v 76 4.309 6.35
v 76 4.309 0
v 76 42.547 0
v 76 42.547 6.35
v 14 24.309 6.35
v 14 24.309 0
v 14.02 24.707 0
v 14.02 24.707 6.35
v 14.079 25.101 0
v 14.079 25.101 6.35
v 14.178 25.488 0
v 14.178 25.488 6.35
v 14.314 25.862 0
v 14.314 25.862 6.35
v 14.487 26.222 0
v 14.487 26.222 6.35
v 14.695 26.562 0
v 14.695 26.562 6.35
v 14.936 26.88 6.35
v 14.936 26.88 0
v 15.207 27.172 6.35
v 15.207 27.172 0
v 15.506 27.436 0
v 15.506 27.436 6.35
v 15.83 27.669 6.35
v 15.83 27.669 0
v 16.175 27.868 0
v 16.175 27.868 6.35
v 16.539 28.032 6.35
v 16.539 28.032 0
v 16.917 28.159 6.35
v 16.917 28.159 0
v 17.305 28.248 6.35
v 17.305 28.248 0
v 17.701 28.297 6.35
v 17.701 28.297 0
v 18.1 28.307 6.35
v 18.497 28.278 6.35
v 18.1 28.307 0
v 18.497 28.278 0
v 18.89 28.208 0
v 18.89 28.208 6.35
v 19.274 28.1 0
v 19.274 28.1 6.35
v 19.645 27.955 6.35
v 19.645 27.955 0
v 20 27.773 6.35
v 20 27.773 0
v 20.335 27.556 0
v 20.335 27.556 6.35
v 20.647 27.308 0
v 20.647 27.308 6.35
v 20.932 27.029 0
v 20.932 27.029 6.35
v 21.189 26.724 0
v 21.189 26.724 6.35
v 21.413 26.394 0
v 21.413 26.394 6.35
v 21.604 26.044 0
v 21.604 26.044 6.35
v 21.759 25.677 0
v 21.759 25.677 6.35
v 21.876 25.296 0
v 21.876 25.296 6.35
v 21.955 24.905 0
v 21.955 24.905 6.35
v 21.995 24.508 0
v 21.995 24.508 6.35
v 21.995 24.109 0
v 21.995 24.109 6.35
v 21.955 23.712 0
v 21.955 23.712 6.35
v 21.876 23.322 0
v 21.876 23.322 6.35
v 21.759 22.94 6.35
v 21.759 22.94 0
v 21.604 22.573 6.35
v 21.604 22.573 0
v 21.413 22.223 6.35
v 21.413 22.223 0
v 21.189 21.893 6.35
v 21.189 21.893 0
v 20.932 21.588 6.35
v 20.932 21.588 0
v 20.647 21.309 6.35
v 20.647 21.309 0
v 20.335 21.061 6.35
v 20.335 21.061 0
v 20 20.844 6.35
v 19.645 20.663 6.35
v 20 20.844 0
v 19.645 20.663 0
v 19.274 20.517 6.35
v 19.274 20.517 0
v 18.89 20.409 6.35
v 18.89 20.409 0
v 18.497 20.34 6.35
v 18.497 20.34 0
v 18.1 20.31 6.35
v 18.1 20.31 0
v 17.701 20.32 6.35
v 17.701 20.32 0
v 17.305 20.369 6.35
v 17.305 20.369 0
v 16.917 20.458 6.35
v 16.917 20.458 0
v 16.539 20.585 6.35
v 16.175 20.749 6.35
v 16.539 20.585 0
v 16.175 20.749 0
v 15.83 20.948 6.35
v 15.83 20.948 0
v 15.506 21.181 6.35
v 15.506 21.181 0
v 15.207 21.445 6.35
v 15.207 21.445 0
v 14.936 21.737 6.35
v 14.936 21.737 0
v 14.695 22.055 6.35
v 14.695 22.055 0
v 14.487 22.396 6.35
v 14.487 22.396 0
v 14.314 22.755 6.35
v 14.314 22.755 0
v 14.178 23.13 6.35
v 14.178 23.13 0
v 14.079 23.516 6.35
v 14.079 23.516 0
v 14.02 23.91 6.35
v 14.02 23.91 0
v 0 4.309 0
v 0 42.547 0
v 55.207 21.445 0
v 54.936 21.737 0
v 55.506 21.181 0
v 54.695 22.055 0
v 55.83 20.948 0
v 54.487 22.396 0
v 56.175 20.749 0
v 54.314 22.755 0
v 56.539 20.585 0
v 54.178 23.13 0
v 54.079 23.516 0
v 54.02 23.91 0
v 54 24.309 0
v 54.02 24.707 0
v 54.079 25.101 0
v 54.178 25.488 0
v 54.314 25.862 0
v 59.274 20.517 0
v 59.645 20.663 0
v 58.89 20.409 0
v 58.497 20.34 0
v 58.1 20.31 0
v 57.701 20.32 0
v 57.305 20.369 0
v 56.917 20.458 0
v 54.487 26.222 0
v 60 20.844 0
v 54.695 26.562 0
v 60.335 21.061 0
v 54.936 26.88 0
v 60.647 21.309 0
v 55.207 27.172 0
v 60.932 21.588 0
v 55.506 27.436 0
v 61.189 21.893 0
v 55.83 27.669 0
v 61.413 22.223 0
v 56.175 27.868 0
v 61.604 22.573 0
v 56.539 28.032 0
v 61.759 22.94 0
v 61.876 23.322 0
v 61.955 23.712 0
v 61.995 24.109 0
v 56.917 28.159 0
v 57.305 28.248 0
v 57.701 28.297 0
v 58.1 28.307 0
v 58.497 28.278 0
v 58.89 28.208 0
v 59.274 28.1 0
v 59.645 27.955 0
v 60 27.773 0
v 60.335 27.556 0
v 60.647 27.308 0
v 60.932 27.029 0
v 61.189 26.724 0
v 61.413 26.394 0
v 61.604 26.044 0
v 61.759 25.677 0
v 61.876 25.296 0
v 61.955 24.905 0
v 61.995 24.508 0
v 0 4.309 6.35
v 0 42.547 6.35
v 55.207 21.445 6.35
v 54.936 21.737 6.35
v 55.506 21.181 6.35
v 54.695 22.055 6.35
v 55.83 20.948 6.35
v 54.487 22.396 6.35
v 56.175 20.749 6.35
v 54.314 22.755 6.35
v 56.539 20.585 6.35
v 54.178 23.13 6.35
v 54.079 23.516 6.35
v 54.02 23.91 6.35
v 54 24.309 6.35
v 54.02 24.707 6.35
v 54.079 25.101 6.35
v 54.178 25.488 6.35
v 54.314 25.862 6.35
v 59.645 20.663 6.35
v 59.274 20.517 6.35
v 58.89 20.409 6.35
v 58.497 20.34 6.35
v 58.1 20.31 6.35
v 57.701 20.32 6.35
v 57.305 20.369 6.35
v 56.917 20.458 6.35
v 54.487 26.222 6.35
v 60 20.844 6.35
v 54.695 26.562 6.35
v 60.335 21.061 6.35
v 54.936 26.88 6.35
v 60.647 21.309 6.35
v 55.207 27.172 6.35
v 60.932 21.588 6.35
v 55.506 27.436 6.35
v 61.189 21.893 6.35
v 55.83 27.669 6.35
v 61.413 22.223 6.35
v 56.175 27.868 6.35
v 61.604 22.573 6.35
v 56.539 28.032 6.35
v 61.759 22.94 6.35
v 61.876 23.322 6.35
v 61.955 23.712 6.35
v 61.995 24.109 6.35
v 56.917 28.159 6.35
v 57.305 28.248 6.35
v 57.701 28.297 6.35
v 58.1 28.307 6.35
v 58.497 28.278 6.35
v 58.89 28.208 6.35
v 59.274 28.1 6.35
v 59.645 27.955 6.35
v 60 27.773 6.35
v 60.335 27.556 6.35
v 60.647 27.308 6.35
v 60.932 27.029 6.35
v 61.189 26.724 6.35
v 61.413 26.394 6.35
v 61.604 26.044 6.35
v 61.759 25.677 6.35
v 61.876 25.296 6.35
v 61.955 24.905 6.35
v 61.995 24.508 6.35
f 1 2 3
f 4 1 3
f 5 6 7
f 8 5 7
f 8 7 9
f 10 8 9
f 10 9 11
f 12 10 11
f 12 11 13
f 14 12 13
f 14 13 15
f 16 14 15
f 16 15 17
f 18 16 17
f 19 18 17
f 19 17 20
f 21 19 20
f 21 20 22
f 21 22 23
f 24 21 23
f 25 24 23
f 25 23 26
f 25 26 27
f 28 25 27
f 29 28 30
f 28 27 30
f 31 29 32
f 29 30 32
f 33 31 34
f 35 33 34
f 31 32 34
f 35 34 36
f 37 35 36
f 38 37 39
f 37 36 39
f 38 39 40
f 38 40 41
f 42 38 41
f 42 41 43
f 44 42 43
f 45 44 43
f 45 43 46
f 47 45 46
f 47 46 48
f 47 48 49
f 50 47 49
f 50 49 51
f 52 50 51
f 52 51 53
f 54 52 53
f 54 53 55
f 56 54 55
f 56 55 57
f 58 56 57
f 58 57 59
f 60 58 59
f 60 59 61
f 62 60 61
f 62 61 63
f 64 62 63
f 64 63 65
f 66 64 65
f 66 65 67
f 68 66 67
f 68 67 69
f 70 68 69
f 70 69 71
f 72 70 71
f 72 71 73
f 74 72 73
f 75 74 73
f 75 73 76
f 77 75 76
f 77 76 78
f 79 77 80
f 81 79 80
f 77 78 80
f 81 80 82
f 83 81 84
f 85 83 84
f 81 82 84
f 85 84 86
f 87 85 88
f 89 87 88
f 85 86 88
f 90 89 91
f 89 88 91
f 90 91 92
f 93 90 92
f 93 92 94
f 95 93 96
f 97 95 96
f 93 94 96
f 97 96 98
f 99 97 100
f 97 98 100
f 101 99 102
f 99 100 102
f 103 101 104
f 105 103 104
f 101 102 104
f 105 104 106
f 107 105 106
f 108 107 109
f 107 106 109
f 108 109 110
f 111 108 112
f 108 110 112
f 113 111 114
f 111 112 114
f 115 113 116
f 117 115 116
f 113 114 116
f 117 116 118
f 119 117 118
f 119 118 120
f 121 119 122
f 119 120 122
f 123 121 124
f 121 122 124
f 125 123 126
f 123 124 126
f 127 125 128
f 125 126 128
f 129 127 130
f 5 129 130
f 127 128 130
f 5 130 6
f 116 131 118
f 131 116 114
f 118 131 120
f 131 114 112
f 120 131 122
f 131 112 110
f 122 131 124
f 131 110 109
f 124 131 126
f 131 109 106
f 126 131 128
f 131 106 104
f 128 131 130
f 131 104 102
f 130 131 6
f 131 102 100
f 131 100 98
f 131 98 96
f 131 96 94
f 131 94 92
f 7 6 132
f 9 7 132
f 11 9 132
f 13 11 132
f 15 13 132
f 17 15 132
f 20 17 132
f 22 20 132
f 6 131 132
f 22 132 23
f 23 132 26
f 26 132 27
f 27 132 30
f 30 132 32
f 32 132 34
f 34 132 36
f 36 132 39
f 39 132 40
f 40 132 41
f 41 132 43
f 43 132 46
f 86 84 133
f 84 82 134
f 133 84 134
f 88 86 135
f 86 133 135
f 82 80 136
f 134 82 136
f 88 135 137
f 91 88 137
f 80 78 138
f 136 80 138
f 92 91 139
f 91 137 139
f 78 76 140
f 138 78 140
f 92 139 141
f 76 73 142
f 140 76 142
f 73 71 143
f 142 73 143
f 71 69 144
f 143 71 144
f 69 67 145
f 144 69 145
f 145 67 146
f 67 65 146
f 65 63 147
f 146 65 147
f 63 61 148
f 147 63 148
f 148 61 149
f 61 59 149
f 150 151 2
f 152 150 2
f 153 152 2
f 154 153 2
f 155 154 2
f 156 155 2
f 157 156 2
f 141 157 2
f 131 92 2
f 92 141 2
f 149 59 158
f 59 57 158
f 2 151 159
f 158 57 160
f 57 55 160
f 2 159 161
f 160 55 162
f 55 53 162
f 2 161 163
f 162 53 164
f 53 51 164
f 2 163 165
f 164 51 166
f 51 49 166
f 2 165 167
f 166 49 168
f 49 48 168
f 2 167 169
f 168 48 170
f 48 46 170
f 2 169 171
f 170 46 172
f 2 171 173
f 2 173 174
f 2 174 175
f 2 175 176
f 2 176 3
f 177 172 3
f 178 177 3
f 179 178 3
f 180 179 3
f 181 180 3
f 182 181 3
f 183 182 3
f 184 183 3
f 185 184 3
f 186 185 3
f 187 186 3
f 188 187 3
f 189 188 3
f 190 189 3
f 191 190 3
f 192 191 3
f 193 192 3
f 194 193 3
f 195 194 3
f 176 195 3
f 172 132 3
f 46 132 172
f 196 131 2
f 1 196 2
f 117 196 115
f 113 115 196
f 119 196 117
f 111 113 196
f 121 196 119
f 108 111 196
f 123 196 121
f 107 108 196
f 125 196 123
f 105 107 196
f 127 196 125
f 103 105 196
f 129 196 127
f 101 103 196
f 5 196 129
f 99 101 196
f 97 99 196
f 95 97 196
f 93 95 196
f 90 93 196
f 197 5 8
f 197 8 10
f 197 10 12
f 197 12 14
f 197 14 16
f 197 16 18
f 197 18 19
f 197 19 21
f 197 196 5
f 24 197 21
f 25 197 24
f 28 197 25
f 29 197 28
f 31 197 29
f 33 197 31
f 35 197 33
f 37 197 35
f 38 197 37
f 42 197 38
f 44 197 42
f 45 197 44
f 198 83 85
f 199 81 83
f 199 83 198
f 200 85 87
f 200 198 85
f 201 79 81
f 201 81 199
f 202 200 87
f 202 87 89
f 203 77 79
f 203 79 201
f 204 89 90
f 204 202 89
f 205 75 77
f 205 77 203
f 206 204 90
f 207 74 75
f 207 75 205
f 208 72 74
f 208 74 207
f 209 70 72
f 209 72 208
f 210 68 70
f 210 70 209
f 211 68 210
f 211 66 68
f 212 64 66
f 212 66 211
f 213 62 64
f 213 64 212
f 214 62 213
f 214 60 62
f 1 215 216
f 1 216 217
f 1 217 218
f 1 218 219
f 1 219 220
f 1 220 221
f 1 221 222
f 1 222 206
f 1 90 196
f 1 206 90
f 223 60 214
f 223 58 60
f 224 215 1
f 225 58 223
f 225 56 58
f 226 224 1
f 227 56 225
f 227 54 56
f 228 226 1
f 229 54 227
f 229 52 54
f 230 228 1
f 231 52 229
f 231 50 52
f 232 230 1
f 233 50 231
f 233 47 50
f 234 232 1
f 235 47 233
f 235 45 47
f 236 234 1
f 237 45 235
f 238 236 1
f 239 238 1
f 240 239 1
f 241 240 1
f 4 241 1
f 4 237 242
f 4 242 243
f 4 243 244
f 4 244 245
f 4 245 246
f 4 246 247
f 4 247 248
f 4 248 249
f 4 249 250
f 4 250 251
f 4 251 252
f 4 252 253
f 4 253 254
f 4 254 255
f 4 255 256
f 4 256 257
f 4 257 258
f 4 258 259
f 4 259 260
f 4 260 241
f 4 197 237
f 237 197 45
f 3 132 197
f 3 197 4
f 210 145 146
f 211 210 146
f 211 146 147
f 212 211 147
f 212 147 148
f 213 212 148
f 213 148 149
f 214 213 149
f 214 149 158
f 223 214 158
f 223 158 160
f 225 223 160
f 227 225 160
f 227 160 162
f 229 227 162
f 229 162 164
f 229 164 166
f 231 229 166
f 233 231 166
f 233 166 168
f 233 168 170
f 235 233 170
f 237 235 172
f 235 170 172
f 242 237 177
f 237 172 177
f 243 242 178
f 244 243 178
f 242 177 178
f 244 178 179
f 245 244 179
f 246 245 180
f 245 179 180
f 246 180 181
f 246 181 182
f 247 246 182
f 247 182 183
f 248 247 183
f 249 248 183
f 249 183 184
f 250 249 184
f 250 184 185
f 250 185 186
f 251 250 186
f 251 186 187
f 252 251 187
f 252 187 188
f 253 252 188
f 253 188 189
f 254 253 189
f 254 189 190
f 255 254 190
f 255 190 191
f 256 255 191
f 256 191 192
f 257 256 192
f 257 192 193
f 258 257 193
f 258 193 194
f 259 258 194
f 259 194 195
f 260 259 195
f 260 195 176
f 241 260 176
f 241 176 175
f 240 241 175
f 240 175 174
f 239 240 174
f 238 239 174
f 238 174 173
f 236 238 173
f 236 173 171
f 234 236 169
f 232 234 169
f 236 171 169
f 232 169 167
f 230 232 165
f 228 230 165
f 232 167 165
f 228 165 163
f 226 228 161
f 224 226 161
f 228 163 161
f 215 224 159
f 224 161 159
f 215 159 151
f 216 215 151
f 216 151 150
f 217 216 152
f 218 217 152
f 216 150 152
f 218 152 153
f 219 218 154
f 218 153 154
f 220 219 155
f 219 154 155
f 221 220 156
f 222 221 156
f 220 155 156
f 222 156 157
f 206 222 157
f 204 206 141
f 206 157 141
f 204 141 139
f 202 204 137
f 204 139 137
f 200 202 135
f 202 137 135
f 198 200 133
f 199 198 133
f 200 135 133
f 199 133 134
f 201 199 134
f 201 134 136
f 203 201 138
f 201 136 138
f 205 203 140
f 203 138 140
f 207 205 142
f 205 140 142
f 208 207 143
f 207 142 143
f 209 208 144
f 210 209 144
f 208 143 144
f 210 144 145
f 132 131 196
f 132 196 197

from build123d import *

# Parameters (mm, degrees)
SKETCH1_W             = 76
SKETCH1_H             = 38.238165328
SKETCH1_R             = 1.27
BOSS_EXTRUDE1_DEPTH   = 6.35
F_8_0MM_DOWEL_HOLE1_D = 8


with BuildPart() as part:
    # Sketch1 → Boss-Extrude1 (new body)
    with BuildSketch(Plane.XY):
        with Locations((38, 23.427645759)):
            Rectangle(SKETCH1_W, SKETCH1_H)
        with Locations((18, 24.308563095)):
            Circle(SKETCH1_R, mode=Mode.SUBTRACT)
        with Locations((58, 24.308563095)):
            Circle(SKETCH1_R, mode=Mode.SUBTRACT)
    extrude(amount=BOSS_EXTRUDE1_DEPTH)

    # Ø8.0mm Dowel Hole1 (through all)
    with Locations(Plane.XY.offset(6.35)):
        with Locations((18, 24.308563095), (58, 24.308563095)):
            Hole(F_8_0MM_DOWEL_HOLE1_D / 2)


solid = part.part
